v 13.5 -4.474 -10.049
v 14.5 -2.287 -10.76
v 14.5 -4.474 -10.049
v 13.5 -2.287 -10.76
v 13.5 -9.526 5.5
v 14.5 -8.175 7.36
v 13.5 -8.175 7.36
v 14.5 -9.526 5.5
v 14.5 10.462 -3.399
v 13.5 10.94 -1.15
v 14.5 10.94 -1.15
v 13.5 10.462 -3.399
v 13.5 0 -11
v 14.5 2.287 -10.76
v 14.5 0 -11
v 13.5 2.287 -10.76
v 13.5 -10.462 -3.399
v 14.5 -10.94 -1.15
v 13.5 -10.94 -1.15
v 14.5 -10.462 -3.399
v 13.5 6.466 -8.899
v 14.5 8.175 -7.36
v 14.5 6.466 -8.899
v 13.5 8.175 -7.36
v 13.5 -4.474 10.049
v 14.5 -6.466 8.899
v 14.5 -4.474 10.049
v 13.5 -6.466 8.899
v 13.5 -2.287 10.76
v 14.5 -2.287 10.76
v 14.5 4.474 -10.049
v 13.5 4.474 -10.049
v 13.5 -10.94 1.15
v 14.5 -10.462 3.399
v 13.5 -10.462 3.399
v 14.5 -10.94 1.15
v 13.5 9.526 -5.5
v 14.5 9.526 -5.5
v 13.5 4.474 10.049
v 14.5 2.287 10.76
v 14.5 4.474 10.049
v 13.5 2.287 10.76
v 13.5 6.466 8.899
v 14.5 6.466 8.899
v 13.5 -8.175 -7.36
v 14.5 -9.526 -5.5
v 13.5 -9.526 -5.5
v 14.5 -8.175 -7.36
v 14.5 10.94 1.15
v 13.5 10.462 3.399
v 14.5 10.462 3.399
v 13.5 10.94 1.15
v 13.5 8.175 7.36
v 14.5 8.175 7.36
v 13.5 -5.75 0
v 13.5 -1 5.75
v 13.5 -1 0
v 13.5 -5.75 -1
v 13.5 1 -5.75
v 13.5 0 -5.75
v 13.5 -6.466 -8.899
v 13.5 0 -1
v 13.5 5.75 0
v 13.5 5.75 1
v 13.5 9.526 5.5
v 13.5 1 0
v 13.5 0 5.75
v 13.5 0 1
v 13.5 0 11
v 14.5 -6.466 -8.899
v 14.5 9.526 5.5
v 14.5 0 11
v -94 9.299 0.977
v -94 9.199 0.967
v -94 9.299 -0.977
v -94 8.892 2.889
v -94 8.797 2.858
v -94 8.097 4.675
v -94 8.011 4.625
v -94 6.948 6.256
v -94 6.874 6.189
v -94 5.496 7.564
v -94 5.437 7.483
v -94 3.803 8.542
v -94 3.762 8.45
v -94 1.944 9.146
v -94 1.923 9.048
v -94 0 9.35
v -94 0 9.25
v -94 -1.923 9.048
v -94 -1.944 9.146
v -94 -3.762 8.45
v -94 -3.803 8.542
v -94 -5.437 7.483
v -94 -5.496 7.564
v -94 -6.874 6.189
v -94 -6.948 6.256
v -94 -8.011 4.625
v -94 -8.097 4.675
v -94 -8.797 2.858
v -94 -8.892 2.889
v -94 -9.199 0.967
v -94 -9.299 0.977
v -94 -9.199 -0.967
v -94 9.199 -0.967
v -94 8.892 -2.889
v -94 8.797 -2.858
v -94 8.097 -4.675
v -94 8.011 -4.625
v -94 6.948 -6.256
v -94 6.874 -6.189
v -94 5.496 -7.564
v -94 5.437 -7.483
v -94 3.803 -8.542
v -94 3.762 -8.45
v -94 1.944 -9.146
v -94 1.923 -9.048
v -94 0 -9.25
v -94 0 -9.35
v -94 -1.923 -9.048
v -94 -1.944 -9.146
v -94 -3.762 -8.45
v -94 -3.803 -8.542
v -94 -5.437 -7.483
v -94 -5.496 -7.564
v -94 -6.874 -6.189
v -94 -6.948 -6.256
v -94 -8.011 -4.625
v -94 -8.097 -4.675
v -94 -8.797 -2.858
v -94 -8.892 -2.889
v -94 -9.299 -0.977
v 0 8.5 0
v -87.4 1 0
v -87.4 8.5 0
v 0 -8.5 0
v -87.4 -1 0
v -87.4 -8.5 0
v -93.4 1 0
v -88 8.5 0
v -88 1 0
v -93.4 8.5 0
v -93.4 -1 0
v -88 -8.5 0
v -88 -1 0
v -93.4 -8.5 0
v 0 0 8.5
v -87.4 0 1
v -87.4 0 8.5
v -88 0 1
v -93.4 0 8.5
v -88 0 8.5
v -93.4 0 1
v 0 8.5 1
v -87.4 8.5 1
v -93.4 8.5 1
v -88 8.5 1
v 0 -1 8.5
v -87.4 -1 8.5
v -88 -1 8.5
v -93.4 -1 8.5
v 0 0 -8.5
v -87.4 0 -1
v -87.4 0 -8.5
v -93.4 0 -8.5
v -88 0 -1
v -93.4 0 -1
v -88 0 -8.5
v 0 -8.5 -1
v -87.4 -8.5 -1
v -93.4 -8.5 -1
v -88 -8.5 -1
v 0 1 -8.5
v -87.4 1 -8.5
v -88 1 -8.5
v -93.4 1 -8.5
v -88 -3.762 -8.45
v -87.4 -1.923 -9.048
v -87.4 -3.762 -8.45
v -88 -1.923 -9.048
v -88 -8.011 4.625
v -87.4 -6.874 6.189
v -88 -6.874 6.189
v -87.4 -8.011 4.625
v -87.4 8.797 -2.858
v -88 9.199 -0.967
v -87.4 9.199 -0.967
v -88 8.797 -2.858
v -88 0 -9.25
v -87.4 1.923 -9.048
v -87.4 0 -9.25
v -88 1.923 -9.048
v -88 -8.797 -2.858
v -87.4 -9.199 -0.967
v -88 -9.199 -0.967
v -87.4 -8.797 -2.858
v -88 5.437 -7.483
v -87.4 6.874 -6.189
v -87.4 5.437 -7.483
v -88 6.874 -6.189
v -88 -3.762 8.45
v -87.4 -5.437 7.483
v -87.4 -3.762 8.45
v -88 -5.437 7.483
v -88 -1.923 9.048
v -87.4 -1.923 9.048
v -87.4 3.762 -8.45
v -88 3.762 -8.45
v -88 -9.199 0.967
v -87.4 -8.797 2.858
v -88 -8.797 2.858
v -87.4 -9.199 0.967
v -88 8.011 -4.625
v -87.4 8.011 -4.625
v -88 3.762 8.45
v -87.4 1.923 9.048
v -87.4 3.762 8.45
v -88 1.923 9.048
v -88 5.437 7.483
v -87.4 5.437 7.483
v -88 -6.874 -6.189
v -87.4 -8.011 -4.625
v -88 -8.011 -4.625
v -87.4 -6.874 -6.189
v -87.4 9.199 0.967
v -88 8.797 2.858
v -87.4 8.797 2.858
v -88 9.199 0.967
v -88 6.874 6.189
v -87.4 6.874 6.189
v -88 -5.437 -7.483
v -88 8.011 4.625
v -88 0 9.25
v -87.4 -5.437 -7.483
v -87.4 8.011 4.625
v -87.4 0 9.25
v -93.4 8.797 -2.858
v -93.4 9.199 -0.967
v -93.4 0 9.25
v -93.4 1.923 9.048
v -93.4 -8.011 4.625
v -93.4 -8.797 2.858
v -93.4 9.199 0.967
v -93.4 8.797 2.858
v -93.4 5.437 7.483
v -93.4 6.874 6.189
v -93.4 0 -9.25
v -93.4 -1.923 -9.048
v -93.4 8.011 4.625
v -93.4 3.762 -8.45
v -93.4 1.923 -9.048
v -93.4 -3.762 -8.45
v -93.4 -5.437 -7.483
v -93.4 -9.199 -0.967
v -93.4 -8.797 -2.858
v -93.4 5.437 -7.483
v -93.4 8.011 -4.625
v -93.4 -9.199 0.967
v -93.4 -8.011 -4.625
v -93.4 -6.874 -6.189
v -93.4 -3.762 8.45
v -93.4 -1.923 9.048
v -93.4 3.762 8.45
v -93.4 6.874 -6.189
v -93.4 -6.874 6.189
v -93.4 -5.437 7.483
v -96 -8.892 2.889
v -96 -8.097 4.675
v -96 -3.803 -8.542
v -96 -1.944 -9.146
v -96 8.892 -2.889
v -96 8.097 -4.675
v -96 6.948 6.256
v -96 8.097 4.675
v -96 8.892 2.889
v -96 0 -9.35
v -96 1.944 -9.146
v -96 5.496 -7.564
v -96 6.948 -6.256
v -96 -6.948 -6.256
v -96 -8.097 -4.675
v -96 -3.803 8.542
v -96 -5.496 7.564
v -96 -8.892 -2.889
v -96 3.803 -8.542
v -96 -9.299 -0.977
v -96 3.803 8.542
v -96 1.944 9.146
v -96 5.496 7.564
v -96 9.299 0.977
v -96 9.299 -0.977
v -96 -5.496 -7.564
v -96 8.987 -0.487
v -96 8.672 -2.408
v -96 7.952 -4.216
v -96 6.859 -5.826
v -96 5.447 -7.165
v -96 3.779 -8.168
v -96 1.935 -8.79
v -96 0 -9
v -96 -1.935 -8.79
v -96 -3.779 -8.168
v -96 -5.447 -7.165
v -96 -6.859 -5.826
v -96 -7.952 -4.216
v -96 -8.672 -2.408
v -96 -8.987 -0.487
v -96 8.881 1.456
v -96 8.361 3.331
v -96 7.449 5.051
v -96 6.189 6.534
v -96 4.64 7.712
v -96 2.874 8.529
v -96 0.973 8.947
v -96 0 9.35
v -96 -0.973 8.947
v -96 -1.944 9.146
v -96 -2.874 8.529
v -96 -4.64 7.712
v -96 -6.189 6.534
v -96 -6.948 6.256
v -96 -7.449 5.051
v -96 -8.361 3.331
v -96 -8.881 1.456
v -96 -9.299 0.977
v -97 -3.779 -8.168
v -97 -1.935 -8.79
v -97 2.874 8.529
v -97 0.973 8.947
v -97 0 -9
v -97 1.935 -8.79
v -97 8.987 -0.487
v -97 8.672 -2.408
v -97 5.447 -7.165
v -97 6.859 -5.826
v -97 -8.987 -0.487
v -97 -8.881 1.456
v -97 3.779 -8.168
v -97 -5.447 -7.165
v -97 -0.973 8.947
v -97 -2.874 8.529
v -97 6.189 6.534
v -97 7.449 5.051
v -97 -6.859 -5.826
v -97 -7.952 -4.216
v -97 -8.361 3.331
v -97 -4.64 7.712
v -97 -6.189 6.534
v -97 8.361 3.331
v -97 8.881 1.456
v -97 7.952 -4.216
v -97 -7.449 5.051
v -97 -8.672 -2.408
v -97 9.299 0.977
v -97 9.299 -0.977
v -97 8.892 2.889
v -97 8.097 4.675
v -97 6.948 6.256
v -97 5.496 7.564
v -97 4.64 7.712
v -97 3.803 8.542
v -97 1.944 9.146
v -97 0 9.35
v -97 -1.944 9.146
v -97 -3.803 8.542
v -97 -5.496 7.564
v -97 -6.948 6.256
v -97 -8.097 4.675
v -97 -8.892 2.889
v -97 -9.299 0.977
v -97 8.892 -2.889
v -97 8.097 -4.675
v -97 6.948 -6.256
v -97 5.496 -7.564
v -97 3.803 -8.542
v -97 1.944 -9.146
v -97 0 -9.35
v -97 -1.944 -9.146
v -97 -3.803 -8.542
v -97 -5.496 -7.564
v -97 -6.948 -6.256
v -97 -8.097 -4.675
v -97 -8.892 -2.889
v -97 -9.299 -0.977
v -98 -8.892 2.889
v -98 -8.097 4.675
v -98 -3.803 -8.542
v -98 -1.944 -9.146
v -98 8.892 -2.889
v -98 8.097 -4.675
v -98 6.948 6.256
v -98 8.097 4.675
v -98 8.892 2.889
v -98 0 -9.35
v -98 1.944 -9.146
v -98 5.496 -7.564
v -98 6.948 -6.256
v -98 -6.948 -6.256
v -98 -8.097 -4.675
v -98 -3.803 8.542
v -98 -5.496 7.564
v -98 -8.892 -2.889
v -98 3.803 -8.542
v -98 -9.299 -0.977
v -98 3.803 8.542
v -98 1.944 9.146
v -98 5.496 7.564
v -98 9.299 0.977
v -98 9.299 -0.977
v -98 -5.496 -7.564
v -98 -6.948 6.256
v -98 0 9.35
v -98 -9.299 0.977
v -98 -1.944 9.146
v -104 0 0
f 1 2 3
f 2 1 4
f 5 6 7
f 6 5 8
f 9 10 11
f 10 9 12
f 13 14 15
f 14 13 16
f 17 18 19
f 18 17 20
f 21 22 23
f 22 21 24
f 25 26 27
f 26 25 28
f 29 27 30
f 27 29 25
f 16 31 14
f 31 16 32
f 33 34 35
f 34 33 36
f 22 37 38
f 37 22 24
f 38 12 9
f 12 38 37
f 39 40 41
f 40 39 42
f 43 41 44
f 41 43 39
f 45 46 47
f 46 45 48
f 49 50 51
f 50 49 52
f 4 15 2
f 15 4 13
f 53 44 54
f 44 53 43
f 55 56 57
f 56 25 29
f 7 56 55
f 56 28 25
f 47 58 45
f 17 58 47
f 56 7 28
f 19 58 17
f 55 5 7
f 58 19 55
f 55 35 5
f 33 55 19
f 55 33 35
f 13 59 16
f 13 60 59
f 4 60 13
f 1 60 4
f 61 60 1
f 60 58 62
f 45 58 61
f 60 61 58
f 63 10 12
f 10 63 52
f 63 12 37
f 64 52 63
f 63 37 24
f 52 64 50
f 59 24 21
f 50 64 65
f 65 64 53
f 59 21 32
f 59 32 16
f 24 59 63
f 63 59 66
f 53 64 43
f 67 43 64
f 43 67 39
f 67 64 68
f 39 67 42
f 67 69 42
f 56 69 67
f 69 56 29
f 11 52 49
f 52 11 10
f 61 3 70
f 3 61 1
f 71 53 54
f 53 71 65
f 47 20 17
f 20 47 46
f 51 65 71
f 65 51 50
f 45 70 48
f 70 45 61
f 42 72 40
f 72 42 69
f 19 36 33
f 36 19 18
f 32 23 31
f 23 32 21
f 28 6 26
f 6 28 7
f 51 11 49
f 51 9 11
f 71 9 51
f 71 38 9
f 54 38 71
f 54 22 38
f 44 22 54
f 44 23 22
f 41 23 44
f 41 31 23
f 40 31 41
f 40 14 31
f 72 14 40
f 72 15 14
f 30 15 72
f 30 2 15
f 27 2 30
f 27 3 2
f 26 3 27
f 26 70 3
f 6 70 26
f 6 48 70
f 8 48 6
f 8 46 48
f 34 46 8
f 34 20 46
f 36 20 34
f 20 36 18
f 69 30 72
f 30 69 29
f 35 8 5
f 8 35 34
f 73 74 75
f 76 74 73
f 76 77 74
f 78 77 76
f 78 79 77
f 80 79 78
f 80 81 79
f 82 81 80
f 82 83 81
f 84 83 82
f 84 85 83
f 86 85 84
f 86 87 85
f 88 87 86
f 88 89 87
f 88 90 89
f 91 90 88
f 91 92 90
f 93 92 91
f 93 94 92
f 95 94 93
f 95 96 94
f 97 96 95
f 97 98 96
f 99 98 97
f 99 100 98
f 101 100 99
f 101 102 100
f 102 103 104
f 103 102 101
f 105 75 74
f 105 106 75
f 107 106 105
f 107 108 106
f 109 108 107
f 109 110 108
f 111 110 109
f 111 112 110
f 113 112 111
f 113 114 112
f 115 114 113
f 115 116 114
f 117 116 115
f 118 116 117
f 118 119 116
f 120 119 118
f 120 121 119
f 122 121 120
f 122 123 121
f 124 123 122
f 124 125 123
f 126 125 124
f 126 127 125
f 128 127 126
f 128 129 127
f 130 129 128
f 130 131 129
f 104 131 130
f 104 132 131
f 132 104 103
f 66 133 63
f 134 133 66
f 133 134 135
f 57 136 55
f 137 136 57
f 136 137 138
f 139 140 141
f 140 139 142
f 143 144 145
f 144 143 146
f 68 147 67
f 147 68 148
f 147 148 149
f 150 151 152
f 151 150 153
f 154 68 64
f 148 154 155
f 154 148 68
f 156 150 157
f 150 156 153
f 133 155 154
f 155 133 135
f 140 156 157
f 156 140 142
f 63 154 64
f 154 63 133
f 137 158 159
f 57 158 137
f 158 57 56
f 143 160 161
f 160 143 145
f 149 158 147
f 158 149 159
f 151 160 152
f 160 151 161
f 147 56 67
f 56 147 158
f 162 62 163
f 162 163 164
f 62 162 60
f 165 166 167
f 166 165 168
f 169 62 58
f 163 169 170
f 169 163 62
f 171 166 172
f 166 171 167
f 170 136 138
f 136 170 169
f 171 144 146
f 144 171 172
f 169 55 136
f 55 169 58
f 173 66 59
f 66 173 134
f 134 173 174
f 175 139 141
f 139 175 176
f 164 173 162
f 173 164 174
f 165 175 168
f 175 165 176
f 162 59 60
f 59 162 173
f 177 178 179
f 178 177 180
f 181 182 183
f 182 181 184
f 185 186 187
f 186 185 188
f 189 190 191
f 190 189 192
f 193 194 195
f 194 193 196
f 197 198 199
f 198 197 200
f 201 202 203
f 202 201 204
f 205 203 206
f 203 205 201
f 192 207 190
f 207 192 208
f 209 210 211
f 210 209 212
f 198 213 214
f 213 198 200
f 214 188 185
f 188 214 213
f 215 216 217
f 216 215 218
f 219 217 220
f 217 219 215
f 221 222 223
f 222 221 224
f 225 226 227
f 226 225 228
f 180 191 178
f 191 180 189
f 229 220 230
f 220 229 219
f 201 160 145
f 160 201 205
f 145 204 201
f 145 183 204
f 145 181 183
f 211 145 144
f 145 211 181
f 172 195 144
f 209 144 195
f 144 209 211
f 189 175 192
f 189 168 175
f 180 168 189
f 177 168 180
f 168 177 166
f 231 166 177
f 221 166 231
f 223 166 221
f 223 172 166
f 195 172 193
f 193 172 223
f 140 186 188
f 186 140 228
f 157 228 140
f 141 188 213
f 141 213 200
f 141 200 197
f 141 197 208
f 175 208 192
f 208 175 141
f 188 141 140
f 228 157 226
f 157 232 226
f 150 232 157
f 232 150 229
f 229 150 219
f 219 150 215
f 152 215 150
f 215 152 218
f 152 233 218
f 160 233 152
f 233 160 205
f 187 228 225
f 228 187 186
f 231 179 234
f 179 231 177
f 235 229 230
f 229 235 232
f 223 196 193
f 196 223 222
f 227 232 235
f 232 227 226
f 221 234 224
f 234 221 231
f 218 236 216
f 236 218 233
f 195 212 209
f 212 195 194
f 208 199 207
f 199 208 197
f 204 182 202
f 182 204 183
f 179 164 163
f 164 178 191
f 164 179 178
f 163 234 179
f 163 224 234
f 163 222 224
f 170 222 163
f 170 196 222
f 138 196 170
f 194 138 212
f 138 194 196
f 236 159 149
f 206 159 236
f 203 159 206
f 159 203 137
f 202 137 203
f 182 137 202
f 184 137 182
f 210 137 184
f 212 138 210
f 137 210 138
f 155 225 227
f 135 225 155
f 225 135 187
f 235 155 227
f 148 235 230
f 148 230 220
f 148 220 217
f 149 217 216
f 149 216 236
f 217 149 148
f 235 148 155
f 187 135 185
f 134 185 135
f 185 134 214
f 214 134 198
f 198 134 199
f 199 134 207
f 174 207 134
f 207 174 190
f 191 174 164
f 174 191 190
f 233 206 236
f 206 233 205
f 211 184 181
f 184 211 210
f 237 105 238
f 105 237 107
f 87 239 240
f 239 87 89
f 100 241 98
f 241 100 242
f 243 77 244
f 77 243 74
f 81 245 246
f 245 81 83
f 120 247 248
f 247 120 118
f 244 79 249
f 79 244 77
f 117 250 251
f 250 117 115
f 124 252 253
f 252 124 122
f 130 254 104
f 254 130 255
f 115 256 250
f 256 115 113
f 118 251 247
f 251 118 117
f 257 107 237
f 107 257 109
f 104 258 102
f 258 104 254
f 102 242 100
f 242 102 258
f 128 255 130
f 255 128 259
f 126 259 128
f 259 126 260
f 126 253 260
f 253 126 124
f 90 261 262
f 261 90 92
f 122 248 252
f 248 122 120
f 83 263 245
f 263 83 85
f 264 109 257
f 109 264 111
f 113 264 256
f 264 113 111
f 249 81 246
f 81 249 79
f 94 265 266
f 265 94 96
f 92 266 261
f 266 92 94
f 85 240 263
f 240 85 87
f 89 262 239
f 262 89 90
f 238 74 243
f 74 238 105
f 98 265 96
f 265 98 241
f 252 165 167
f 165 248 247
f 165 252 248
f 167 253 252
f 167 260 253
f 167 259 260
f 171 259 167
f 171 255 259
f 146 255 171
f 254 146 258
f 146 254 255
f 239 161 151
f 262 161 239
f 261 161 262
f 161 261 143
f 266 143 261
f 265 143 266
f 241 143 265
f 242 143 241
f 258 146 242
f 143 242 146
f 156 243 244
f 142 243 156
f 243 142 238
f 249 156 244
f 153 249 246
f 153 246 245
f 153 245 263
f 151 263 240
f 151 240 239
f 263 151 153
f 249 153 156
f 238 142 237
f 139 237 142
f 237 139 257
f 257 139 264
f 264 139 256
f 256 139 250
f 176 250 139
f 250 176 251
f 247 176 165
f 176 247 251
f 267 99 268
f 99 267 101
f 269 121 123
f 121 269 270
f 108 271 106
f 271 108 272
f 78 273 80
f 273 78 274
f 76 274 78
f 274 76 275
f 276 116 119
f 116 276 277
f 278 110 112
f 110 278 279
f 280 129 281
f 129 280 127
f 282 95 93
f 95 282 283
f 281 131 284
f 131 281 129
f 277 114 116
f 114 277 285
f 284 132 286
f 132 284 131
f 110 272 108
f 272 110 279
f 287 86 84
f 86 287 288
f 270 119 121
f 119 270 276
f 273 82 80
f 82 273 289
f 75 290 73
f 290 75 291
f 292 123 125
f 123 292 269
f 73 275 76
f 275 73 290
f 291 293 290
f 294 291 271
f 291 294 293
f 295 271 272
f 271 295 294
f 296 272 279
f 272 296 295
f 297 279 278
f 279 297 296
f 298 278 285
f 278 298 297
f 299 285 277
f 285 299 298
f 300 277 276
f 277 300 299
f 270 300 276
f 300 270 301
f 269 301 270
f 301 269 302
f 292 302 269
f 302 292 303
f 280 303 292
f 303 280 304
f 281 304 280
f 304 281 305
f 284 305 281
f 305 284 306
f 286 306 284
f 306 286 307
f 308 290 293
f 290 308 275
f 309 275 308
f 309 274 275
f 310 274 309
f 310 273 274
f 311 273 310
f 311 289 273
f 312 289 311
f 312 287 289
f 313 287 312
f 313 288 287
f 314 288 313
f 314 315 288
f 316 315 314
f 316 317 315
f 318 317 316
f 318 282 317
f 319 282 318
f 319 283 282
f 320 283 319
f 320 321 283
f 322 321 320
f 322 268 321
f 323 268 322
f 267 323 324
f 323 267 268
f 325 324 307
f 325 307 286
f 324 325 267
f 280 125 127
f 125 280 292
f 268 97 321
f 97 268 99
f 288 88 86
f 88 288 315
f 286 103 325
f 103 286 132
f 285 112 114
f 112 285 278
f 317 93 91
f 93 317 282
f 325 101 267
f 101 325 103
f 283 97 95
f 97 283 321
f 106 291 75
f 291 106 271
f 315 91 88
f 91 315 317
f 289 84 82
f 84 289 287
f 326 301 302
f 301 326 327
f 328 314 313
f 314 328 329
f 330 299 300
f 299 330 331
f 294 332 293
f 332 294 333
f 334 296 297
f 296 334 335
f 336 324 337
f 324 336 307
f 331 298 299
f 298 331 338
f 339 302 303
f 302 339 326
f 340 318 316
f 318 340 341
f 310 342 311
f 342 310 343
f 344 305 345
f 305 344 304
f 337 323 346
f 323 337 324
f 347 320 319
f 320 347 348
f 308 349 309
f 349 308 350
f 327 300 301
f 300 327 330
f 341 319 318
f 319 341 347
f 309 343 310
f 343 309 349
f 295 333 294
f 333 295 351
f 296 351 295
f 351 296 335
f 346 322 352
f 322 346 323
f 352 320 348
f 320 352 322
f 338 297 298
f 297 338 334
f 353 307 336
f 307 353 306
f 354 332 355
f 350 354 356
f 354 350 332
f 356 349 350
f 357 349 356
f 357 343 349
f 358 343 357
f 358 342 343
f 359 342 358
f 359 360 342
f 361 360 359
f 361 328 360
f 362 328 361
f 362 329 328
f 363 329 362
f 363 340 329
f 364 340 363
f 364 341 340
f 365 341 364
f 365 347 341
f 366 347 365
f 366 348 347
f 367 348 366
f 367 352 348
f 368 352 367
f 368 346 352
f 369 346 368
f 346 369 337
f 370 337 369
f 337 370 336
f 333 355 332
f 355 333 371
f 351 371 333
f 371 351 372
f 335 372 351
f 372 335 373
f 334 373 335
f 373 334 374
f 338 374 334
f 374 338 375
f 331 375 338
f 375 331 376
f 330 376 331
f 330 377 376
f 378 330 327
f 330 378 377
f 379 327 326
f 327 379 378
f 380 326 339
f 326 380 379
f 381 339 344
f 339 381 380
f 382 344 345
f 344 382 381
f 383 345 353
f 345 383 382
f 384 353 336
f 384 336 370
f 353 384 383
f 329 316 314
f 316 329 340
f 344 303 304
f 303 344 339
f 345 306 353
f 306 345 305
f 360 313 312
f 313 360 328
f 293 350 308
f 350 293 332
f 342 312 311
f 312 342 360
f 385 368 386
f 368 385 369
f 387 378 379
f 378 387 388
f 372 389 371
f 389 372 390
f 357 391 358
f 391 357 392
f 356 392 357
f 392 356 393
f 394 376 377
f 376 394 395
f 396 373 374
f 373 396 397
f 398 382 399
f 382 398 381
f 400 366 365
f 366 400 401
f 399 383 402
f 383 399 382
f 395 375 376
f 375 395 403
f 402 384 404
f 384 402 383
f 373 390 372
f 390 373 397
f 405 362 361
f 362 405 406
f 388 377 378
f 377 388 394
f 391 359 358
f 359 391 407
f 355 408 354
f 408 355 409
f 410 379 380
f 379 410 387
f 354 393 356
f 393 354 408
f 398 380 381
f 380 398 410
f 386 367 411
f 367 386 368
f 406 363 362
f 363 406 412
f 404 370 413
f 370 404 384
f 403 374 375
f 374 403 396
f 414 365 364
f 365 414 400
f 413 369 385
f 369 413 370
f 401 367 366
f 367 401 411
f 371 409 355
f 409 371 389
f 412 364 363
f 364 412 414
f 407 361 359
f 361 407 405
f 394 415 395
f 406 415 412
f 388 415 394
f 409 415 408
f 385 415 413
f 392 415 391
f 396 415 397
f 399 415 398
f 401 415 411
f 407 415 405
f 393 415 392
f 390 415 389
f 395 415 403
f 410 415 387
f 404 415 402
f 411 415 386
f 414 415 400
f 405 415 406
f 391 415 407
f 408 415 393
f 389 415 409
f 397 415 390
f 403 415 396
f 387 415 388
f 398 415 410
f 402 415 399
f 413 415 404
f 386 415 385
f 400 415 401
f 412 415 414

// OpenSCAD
//linear_extrude( height=2.5 ) polygon( points = [ [0,5.25], [0,19.75], [ 20, 25], [40, 19.75], [40, 5.25], [20,0], [0,5.25] ]);

//the top disk-needs to be measured

module plunger() {    
    color("white") {
        translate([13.5, 0, 0]) rotate( [0,90,0] ) cylinder(h=1, r=22/2);

        // one 'wing'
        linear_extrude( height=1 ) polygon( points = [[-94,0],[-94,8.5], [0,8.5], [ 13.5, 5.75], [13.5,0],  [-94,0] ]);
        rotate([90,0,0]) linear_extrude( height=1 ) polygon( points = [[-94,0],[-94,8.5], [0,8.5], [ 13.5, 5.75], [13.5,0],  [-94,0] ]);
        rotate([180,0,0]) linear_extrude( height=1 ) polygon( points = [[-94,0],[-94,8.5], [0,8.5], [ 13.5, 5.75], [13.5,0],  [-94,0] ]);
        rotate([270,0,0]) linear_extrude( height=1 ) polygon( points = [[-94,0],[-94,8.5], [0,8.5], [ 13.5, 5.75], [13.5,0],  [-94,0] ]);
        translate([-88, 0, 0]) rotate( [0,90,0] ) cylinder(h=.6, r=18.5/2);
        translate([-94, 0, 0]) rotate( [0,90,0] ) cylinder(h=.6, r=18.5/2);
    }



    color("black") {
        translate([-96, 0, 0]) rotate( [0,90,0] ) cylinder(h=2, r=18.7/2);
        translate([-97, 0, 0]) rotate( [0,90,0] ) cylinder(r=18.0/2, height=1);
        translate([-98, 0, 0]) rotate( [0,90,0] ) cylinder(r=18.7/2, height=2);
        translate([-104, 0, 0]) rotate( [0,90,0] ) cylinder(h=6, r1=0, r2=18.7/2);
    }
}

plunger();
